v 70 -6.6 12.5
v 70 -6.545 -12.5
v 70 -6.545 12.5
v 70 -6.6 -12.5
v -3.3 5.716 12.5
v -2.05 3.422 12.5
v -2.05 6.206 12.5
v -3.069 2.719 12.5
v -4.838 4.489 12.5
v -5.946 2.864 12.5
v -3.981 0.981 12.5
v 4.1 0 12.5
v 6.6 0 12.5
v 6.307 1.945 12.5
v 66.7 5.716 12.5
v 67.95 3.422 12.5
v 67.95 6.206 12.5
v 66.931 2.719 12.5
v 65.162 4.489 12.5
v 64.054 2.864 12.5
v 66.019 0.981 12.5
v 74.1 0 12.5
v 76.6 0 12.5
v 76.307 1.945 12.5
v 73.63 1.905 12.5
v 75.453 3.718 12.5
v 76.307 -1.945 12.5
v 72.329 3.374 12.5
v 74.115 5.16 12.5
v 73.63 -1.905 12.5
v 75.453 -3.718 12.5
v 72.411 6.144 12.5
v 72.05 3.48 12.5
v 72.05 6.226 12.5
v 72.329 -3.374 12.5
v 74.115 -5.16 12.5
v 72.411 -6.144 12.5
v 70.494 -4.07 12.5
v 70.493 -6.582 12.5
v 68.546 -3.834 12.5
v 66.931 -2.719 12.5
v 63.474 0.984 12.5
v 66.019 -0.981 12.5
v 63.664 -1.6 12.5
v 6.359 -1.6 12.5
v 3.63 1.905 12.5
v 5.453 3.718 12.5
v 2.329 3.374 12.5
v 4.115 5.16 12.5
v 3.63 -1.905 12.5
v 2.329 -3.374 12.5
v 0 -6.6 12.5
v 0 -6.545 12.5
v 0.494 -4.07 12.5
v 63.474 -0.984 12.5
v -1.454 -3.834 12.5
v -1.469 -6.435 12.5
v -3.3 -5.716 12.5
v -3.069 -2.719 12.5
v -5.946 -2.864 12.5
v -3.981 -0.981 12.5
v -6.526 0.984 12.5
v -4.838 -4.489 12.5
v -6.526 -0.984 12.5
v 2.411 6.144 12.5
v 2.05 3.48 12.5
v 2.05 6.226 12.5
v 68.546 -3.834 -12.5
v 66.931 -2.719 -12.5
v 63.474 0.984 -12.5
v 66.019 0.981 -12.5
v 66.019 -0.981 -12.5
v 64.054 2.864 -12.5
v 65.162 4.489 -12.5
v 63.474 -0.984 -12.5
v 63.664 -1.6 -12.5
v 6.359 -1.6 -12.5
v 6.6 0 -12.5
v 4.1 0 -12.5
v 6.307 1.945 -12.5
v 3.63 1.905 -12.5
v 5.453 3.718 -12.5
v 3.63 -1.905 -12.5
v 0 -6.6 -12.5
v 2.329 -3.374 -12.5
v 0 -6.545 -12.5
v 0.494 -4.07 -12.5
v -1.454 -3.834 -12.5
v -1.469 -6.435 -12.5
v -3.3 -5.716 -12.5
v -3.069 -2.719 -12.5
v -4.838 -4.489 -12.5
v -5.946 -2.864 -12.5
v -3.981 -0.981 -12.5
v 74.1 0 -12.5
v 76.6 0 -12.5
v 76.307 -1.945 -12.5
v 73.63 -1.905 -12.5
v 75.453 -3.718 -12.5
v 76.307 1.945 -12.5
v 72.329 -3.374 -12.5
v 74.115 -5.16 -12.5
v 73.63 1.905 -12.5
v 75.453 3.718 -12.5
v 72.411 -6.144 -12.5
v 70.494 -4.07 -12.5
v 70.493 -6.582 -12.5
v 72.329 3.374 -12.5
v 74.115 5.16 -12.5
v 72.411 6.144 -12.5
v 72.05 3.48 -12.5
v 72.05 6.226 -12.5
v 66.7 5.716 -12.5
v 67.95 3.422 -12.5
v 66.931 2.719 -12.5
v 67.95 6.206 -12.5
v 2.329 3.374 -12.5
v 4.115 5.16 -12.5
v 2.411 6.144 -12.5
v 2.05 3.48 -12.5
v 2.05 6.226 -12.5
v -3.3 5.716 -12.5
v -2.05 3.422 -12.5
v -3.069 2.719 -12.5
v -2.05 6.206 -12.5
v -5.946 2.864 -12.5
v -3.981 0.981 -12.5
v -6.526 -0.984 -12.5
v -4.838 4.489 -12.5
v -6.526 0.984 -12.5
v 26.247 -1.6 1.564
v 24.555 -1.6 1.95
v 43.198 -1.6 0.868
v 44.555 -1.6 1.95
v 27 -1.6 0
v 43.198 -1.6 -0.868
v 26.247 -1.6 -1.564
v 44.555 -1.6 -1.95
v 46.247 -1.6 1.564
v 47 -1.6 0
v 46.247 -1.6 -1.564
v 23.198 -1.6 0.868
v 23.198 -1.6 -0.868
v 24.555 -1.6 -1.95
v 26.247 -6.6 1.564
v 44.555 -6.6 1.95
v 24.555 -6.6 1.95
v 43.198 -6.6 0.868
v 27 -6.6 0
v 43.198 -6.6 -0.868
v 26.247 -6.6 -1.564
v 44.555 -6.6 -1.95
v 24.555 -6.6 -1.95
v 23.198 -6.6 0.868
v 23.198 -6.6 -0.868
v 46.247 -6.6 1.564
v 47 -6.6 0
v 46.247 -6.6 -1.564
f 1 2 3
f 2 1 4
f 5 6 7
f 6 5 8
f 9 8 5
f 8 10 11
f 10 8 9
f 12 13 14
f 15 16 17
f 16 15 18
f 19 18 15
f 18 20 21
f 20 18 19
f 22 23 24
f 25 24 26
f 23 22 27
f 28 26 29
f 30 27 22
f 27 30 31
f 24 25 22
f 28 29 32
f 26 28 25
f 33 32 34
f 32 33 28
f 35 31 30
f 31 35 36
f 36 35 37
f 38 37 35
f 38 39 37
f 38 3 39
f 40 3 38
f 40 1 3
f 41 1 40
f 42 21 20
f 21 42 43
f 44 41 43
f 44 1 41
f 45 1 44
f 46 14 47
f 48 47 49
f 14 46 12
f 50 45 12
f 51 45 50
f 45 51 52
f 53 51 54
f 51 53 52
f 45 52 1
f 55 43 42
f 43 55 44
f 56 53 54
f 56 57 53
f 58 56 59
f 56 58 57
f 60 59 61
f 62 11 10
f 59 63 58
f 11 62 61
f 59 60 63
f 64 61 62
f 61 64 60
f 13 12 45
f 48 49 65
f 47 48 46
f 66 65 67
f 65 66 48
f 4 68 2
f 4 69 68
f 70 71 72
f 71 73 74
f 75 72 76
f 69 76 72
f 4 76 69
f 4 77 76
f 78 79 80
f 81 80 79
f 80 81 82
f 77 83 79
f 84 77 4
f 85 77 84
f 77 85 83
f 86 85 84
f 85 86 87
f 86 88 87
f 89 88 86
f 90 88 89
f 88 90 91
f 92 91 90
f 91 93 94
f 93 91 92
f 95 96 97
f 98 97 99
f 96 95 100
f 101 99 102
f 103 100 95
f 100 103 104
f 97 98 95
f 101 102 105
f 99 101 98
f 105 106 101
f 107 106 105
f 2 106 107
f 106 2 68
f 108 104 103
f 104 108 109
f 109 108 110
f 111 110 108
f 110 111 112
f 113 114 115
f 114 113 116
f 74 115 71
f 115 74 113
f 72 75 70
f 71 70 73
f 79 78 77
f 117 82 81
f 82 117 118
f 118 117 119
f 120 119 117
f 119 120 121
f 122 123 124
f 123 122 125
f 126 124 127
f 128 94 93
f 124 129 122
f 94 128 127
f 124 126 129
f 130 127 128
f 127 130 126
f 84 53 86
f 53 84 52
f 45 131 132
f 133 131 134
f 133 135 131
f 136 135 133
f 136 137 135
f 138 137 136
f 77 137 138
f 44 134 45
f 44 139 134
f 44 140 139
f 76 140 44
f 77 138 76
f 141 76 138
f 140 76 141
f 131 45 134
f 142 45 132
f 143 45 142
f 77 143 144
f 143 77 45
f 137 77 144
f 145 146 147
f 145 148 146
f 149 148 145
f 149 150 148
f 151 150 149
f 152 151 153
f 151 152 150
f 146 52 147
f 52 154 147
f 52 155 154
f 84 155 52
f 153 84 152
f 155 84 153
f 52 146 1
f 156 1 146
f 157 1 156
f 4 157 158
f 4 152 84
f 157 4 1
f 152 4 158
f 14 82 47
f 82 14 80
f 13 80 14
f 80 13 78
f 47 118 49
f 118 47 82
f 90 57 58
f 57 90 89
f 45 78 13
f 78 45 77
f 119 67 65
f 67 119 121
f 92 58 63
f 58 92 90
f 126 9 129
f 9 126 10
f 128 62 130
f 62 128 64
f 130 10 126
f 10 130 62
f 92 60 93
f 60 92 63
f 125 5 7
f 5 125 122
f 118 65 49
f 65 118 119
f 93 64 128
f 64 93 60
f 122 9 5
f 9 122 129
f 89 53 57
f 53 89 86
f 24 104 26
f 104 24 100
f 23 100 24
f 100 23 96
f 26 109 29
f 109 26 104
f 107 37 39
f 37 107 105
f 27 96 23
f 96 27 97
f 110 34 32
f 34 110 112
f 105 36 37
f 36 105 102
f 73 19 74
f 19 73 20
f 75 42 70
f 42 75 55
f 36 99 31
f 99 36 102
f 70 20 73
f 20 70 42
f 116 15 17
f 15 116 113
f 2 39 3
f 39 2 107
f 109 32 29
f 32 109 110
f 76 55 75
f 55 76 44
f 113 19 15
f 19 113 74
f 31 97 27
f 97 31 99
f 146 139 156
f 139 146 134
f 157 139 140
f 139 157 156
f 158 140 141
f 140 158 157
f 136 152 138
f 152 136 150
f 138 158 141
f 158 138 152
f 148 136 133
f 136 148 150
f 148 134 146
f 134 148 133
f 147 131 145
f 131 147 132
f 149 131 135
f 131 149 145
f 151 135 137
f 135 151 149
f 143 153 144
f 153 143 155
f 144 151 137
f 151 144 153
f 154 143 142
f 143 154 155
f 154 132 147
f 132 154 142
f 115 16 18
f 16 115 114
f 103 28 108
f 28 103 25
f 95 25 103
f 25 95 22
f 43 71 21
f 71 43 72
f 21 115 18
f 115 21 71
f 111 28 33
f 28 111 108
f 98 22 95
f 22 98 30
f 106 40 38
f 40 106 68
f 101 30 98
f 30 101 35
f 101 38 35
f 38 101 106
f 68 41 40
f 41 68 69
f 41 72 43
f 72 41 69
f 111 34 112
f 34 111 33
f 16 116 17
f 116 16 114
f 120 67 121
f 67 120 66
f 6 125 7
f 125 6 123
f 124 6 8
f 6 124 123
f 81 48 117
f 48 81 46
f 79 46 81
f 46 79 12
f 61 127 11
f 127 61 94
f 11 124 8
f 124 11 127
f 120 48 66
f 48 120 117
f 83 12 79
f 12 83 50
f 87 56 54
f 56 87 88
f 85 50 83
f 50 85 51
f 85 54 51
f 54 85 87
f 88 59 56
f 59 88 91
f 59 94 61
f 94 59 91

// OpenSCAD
// file: Rook_Config.scad
// Rook 3D Printer Configuration
// Created By Jeffrey Olijar 
// Jolijar@gmail.com
// Revision 1.01


// 608 skate bearing
Bearing_OD = 22.5; 
Bearing_ID = 8;
Bearing_H = 7;

//M5 Screw Hole Diameter
M5 = 5;
//M4 Screw Hole Diameter
M4 = 4;

//M8 Rod Diameter (configure for a tight fit)
M8 = 8.2;
//M8 Nut Diameter
N8 = 15.5;

//LM8UU Bearing
LBD = 15.5; // Diameter
LBH = 25; // Height
LBI = 8;  // Inner Diameter

//Makergear Groovemount
GVO = 16.5; // Outside Diameter
GVI = 12.5;  // Inside Groove Diameter

// Distance Between Centers for X rods
DBCX = 70;
// main file
// Rook 3D Printer 
// X Rod Holder
// Created By Jeffrey Olijar 
// Jolijar@gmail.com
// Revision 1.00
// 2 x required 

include <Rook_Config.scad> 


module Rook_X_Rod_Holder(){





difference(){ 
union(){

	translate (v=[DBCX/2,-M8/2,0]){ 
		cube(size =[DBCX,5,25], center = true); 
		}
	cylinder(h=25,r=M8/2+2.5, center = true);
	translate (v=[DBCX,0,0]){ 
		cylinder(h=25,r=M8/2+2.5, center = true);
}}
union(){

rotate(a=[90,0,0])translate(v=[DBCX/2,0,0]){ 

translate(v=[10,0,-20]){
cylinder(h=50,r=M4/2);
}
translate(v=[-10,0,-20]){
cylinder(h=50,r=M4/2);
}}
translate(v=[0,0,0]){
	cylinder(h=25,r=M8/2, center = true);
}
	translate (v=[0,M8/2,0]){ 
		cube(size =[M8/2,M8,25], center = true);  // Cutout for Rod Holder
	translate (v=[DBCX,-M8/2,0]){ 
translate(v=[0,0,0]){
		cylinder(h=25,r=M8/2, center = true);
}
	translate (v=[0,M8/2,0]){ 
		cube(size =[M8/2,M8,25], center = true);  // Cutout for Rod Holder
}}}}}}




















Rook_X_Rod_Holder();
